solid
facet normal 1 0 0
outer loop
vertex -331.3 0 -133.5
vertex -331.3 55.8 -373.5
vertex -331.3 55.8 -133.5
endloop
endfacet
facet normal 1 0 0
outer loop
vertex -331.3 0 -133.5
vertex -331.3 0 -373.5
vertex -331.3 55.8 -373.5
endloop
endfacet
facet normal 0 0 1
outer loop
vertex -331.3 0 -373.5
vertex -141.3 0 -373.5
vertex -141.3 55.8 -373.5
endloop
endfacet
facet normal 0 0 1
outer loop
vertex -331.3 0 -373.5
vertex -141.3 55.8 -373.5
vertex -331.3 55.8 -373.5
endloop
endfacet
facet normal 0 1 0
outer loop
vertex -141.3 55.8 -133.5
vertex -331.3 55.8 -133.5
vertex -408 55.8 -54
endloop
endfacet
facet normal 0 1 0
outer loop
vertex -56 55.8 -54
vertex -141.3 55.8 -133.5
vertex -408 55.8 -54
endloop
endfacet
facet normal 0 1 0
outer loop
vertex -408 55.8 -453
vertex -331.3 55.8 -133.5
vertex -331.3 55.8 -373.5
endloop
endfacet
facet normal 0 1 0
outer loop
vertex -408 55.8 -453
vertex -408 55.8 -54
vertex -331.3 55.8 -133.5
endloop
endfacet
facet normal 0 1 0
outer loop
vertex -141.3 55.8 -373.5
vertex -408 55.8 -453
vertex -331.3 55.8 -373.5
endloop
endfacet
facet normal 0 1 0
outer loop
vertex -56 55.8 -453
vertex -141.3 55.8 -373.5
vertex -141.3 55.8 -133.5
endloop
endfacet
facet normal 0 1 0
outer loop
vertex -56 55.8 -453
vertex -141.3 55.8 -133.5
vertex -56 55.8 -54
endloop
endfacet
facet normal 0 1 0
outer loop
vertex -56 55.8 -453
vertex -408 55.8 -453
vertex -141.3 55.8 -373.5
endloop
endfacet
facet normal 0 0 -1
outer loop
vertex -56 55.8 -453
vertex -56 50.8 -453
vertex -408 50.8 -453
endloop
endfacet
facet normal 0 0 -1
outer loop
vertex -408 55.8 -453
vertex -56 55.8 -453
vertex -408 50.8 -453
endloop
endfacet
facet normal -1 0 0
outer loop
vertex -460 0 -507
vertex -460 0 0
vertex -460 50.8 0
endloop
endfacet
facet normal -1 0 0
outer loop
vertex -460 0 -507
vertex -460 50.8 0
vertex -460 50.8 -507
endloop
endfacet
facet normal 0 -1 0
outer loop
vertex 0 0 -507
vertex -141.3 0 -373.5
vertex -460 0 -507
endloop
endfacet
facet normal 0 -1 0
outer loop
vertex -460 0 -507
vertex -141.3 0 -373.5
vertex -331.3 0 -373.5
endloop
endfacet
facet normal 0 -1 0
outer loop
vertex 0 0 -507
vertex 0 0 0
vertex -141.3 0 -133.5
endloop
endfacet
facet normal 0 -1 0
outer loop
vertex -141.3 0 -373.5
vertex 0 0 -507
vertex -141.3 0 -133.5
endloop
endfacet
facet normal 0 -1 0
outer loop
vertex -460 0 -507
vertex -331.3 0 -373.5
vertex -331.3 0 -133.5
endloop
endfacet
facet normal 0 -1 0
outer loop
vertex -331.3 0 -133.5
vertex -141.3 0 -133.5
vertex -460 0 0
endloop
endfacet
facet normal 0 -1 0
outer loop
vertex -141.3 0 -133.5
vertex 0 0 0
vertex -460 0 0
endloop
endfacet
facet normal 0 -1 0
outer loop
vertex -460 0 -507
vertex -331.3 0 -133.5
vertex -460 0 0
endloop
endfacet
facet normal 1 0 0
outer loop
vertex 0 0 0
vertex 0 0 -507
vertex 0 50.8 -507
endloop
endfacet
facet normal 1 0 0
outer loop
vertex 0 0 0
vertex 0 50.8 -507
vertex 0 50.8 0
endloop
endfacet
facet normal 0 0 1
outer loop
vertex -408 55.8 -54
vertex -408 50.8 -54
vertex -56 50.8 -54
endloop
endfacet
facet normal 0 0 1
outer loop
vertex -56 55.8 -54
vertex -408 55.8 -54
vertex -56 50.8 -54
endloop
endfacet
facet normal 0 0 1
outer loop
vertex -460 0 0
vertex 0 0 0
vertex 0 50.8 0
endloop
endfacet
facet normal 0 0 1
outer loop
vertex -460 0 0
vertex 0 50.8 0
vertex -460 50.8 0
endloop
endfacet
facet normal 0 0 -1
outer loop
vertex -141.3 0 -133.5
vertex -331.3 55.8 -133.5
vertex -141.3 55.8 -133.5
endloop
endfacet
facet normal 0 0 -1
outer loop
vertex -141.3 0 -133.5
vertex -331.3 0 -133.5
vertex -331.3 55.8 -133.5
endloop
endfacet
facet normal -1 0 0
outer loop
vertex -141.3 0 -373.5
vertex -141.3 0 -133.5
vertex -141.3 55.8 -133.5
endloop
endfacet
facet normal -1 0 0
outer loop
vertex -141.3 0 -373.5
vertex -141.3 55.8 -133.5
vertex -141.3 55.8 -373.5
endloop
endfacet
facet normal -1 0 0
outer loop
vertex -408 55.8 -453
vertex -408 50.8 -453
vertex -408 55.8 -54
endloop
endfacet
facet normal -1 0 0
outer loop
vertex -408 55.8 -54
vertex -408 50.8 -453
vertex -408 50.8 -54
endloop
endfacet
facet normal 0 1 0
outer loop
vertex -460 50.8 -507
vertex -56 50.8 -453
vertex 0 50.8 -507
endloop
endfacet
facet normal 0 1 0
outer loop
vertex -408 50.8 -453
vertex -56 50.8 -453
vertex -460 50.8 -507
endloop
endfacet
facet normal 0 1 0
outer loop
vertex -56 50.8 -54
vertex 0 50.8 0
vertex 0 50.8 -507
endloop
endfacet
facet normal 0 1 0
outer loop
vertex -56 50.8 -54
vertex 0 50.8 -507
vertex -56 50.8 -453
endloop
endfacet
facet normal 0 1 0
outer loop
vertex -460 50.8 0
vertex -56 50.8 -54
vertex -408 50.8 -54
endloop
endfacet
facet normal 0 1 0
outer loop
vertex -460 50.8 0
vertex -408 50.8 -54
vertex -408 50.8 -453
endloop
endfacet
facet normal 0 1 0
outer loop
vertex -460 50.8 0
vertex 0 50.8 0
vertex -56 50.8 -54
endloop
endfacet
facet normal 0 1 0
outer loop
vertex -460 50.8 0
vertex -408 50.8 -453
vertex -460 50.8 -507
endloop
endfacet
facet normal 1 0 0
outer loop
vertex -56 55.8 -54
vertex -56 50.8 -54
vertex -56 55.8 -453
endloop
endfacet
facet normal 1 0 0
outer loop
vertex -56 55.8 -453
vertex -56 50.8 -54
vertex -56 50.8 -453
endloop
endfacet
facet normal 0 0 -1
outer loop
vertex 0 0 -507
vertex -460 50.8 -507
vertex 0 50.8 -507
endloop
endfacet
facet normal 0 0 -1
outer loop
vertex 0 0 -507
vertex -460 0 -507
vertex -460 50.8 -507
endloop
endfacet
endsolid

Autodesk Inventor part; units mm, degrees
ref_plane "YZ Plane" through (0, 0, 0) normal (1, 0, 0) x (0, 1, 0)
ref_plane "XZ Plane" through (0, 0, 0) normal (0, 1, 0) x (-1, 0, 0)
ref_plane "XY Plane" through (0, 0, 0) normal (0, 0, 1) x (1, 0, 0)
sketch "Sketch1" plane through (0, 0, 0) normal (0, 1, 0) x (-1, 0, 0)
  line L0 (0, 0) -> (460, 0)
  line L1 (460, 0) -> (460, -507)
  line L2 (460, -507) -> (0, -507)
  line L3 (0, -507) -> (0, 0)
  line L4 (331.3, -133.5) -> (141.3, -133.5)
  line L5 (141.3, -133.5) -> (141.3, -373.5)
  line L6 (141.3, -373.5) -> (331.3, -373.5)
  line L7 (331.3, -373.5) -> (331.3, -133.5)
  dimension "d0" = 460
  dimension "d1" = 507
  dimension "d2" = 190
  dimension "d3" = 240
  dimension "d4" = 133.5
  dimension "d5" = 141.3
extrude "Extrusion1" add sketch "Sketch1" along normal blind 50.8
sketch "Sketch5" plane through (0, 50.8, 0) normal (0, 1, 0) x (1, 0, 0)
  line L0 (-408, 54) -> (-56, 54)
  line L1 (-56, 54) -> (-56, 453)
  line L2 (-56, 453) -> (-408, 453)
  line L3 (-408, 453) -> (-408, 54)
  line L4 (-460, 0) -> (0, 0) projected
  line L5 (-460, 507) -> (-460, 0) projected
  line L6 (-331.3, 133.5) -> (-141.3, 133.5) projected
  line L7 (-141.3, 373.5) -> (-331.3, 373.5) projected
  line L8 (-331.3, 133.5) -> (-141.3, 133.5)
  line L9 (-141.3, 133.5) -> (-141.3, 373.5)
  line L10 (-141.3, 373.5) -> (-331.3, 373.5)
  line L11 (-331.3, 373.5) -> (-331.3, 133.5)
  dimension "d14" = 352
  dimension "d15" = 399
  dimension "d16" = 54
  dimension "d17" = 52
extrude "Extrusion2" add sketch "Sketch5" along normal blind 5
properties part number "TapaFrontal"
